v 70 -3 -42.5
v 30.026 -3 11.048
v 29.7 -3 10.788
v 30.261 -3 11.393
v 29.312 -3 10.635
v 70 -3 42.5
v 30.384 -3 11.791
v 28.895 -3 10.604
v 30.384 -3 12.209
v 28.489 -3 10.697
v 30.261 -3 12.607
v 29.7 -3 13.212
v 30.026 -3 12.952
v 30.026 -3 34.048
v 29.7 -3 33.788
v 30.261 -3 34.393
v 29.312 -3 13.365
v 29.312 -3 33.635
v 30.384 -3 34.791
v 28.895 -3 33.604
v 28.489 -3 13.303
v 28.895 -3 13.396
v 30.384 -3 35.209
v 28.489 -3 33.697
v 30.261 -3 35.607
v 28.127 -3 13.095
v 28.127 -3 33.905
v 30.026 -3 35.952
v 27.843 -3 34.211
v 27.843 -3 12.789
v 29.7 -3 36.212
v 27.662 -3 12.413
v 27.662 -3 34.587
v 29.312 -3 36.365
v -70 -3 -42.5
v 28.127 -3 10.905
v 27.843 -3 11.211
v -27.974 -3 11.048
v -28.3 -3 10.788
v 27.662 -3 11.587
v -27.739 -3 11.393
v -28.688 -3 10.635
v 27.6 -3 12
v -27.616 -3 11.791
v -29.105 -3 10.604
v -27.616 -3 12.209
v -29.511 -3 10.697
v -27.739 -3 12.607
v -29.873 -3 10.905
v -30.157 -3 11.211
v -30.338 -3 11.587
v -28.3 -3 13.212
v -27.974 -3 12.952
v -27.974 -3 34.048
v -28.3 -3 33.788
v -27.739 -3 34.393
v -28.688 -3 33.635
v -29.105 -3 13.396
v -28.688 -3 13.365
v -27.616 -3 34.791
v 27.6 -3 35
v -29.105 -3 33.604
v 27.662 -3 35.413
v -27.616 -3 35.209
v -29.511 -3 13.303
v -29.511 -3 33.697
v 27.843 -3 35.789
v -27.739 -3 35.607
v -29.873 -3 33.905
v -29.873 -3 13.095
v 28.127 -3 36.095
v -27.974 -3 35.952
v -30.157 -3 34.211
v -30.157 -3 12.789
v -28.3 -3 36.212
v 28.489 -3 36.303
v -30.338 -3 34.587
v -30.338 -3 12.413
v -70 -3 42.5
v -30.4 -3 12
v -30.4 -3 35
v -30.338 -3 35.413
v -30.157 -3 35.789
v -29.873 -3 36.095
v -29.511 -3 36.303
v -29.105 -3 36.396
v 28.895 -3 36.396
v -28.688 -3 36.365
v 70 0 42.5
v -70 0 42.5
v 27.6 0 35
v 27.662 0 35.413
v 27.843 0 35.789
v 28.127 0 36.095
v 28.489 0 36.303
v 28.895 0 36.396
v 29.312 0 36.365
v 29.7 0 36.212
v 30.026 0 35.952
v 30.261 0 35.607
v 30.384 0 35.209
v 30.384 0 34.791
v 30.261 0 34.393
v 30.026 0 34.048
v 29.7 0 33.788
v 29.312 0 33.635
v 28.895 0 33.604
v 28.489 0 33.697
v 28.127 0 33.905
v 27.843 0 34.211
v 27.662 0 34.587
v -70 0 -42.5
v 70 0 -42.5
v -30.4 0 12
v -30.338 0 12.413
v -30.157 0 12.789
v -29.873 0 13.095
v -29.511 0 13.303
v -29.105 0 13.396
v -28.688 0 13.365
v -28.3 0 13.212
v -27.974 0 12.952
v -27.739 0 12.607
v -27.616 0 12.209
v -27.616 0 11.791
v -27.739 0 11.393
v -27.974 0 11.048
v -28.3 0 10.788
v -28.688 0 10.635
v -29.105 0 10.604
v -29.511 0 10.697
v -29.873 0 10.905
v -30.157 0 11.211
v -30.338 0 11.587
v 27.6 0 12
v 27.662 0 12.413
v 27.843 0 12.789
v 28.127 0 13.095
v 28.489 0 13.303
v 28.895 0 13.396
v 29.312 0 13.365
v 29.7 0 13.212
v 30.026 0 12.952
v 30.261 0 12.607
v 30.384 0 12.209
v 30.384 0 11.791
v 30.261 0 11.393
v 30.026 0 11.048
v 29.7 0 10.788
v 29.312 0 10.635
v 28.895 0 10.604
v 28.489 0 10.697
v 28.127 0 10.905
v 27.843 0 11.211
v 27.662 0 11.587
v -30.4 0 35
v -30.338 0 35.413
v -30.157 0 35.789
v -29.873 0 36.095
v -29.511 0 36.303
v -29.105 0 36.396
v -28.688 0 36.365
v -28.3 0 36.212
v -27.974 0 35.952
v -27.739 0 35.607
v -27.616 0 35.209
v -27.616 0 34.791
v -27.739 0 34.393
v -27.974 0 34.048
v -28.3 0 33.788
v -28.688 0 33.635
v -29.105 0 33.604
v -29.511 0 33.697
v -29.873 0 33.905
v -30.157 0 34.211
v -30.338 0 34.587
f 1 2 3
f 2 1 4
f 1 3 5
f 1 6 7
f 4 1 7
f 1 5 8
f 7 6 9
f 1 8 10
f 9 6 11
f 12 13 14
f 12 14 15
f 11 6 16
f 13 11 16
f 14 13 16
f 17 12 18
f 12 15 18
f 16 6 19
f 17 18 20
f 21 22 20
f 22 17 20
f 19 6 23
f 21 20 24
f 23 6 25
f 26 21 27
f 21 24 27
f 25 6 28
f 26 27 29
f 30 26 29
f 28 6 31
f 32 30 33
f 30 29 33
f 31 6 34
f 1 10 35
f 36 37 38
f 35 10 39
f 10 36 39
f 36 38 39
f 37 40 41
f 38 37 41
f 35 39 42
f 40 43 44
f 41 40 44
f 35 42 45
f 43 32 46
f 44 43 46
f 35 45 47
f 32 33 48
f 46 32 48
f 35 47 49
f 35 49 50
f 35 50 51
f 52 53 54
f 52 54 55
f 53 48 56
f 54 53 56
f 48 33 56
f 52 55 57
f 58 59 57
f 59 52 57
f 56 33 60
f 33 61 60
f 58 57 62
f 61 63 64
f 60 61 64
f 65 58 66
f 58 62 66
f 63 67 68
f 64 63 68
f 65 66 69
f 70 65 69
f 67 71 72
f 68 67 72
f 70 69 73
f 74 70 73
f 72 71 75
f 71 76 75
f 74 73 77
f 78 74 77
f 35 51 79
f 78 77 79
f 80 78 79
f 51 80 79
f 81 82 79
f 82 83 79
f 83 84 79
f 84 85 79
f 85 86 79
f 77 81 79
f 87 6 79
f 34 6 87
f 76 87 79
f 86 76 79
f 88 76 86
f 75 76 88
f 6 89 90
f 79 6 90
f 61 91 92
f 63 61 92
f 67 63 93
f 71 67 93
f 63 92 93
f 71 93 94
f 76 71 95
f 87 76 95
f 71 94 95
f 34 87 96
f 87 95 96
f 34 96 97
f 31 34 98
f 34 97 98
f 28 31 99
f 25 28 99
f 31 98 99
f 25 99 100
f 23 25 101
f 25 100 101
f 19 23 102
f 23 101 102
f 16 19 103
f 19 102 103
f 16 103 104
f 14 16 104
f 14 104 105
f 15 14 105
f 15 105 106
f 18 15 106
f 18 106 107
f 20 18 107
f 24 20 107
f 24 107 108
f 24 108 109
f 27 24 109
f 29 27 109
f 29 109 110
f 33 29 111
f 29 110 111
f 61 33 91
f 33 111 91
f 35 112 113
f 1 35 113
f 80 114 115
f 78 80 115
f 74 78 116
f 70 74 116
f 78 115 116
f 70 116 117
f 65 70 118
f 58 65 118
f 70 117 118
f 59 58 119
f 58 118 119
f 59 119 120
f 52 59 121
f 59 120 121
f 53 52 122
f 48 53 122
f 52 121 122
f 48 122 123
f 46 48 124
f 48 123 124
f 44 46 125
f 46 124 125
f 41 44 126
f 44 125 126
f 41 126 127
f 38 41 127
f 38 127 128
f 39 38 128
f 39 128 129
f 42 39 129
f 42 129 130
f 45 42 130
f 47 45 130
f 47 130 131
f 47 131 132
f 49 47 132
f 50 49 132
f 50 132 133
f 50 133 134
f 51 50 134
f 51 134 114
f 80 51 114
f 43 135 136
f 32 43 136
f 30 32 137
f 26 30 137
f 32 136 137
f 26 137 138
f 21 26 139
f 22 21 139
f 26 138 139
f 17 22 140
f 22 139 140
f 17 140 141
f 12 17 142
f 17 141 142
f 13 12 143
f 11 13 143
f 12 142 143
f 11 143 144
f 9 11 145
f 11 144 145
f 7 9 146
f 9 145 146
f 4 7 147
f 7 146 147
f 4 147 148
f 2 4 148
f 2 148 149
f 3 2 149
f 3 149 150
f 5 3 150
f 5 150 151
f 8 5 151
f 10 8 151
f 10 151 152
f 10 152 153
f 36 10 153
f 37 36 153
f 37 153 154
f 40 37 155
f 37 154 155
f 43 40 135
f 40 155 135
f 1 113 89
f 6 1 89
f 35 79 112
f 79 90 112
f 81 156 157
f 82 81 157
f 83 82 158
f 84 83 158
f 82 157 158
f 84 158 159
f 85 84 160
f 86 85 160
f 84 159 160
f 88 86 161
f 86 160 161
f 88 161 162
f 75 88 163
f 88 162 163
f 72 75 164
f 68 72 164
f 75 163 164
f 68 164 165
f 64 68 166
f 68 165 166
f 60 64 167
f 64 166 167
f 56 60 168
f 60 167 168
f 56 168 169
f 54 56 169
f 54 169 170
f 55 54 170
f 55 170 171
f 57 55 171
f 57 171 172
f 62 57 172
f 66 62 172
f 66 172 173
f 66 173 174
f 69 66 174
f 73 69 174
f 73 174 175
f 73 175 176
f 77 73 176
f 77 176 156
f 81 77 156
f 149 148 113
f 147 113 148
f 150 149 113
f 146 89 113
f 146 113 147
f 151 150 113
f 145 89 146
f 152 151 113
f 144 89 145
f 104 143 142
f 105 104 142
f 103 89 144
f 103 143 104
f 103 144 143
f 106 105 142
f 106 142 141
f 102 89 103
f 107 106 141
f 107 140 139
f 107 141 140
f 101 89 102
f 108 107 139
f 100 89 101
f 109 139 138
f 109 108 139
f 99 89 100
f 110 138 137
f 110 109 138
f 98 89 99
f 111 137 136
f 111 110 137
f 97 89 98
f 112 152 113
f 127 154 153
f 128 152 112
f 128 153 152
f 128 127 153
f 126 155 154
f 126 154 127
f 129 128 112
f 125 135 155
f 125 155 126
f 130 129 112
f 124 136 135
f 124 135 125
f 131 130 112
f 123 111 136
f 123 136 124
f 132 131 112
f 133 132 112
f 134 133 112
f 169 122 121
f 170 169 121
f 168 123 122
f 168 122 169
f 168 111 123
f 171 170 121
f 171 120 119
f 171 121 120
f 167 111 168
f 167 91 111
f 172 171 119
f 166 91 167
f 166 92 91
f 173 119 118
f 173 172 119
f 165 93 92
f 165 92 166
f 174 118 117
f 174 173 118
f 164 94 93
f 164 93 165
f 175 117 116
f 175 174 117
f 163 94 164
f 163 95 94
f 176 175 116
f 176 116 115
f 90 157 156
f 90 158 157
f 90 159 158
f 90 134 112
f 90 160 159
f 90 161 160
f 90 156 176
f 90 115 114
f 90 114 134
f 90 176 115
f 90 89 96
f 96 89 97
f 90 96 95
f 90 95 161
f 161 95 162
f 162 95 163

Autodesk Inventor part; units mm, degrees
ref_plane "YZ Plane" through (0, 0, 0) normal (1, 0, 0) x (0, 1, 0)
ref_plane "XZ Plane" through (0, 0, 0) normal (0, 1, 0) x (-1, 0, 0)
ref_plane "XY Plane" through (0, 0, 0) normal (0, 0, 1) x (1, 0, 0)
sketch "Sketch1" plane through (0, 0, 0) normal (0, 1, 0) x (-1, 0, 0)
  line L0 (70, -42.5) -> (-70, -42.5)
  line L1 (-70, -42.5) -> (-70, 42.5)
  line L2 (-70, 42.5) -> (70, 42.5)
  line L3 (70, 42.5) -> (70, -42.5)
  line L4 (70, -42.5) -> (-70, 42.5) construction
  line L5 (-70, -42.5) -> (70, 42.5) construction
  point P0 (0, 0)
  point P1 (0, 0)
  point P2 (0, 0)
  dimension "d0" = 140
  dimension "d1" = 85
extrude "Lid" add sketch "Sketch1" against normal blind 3
sketch "Sketch2" plane through (0, 0, 0) normal (0, 1, 0) x (-1, 0, 0)
  line L0 (29, 12) -> (-29, 12) construction
  line L1 (-29, 12) -> (-29, 35) construction
  line L2 (-29, 35) -> (29, 35) construction
  line L3 (29, 35) -> (29, 12) construction
  line L4 (29, 12) -> (-29, 35) construction
  line L5 (-29, 12) -> (29, 35) construction
  circle A0 centre (29, 12) radius 1.4
  circle A1 centre (-29, 12) radius 1.4
  circle A2 centre (-29, 35) radius 1.4
  circle A3 centre (29, 35) radius 1.4
  point P0 (0, 0)
  point P1 (0, 0)
  point P2 (0, 23.5)
  point P3 (0, 23.5)
  point P4 (0, 23.5)
  dimension "d4" = 23
  dimension "d5" = 58
  dimension "d6" = 12
  dimension "d7" = 2.8
extrude "M3_Mount_Holes" cut sketch "Sketch2" along normal through all both and the other way through all
equation "\"d1\" = 0.607143 * d0"
equation "\"d2\" = 0.0214286 * d0"
equation "\"d4\" = 0.164286 * d0"
equation "\"d5\" = 0.414286 * d0"
equation "\"d6\" = 0.0857143 * d0"
equation "\"d7\" = 0.02 * d0"
properties part number "Top-Lid" material "Polycarbonate, Clear"
